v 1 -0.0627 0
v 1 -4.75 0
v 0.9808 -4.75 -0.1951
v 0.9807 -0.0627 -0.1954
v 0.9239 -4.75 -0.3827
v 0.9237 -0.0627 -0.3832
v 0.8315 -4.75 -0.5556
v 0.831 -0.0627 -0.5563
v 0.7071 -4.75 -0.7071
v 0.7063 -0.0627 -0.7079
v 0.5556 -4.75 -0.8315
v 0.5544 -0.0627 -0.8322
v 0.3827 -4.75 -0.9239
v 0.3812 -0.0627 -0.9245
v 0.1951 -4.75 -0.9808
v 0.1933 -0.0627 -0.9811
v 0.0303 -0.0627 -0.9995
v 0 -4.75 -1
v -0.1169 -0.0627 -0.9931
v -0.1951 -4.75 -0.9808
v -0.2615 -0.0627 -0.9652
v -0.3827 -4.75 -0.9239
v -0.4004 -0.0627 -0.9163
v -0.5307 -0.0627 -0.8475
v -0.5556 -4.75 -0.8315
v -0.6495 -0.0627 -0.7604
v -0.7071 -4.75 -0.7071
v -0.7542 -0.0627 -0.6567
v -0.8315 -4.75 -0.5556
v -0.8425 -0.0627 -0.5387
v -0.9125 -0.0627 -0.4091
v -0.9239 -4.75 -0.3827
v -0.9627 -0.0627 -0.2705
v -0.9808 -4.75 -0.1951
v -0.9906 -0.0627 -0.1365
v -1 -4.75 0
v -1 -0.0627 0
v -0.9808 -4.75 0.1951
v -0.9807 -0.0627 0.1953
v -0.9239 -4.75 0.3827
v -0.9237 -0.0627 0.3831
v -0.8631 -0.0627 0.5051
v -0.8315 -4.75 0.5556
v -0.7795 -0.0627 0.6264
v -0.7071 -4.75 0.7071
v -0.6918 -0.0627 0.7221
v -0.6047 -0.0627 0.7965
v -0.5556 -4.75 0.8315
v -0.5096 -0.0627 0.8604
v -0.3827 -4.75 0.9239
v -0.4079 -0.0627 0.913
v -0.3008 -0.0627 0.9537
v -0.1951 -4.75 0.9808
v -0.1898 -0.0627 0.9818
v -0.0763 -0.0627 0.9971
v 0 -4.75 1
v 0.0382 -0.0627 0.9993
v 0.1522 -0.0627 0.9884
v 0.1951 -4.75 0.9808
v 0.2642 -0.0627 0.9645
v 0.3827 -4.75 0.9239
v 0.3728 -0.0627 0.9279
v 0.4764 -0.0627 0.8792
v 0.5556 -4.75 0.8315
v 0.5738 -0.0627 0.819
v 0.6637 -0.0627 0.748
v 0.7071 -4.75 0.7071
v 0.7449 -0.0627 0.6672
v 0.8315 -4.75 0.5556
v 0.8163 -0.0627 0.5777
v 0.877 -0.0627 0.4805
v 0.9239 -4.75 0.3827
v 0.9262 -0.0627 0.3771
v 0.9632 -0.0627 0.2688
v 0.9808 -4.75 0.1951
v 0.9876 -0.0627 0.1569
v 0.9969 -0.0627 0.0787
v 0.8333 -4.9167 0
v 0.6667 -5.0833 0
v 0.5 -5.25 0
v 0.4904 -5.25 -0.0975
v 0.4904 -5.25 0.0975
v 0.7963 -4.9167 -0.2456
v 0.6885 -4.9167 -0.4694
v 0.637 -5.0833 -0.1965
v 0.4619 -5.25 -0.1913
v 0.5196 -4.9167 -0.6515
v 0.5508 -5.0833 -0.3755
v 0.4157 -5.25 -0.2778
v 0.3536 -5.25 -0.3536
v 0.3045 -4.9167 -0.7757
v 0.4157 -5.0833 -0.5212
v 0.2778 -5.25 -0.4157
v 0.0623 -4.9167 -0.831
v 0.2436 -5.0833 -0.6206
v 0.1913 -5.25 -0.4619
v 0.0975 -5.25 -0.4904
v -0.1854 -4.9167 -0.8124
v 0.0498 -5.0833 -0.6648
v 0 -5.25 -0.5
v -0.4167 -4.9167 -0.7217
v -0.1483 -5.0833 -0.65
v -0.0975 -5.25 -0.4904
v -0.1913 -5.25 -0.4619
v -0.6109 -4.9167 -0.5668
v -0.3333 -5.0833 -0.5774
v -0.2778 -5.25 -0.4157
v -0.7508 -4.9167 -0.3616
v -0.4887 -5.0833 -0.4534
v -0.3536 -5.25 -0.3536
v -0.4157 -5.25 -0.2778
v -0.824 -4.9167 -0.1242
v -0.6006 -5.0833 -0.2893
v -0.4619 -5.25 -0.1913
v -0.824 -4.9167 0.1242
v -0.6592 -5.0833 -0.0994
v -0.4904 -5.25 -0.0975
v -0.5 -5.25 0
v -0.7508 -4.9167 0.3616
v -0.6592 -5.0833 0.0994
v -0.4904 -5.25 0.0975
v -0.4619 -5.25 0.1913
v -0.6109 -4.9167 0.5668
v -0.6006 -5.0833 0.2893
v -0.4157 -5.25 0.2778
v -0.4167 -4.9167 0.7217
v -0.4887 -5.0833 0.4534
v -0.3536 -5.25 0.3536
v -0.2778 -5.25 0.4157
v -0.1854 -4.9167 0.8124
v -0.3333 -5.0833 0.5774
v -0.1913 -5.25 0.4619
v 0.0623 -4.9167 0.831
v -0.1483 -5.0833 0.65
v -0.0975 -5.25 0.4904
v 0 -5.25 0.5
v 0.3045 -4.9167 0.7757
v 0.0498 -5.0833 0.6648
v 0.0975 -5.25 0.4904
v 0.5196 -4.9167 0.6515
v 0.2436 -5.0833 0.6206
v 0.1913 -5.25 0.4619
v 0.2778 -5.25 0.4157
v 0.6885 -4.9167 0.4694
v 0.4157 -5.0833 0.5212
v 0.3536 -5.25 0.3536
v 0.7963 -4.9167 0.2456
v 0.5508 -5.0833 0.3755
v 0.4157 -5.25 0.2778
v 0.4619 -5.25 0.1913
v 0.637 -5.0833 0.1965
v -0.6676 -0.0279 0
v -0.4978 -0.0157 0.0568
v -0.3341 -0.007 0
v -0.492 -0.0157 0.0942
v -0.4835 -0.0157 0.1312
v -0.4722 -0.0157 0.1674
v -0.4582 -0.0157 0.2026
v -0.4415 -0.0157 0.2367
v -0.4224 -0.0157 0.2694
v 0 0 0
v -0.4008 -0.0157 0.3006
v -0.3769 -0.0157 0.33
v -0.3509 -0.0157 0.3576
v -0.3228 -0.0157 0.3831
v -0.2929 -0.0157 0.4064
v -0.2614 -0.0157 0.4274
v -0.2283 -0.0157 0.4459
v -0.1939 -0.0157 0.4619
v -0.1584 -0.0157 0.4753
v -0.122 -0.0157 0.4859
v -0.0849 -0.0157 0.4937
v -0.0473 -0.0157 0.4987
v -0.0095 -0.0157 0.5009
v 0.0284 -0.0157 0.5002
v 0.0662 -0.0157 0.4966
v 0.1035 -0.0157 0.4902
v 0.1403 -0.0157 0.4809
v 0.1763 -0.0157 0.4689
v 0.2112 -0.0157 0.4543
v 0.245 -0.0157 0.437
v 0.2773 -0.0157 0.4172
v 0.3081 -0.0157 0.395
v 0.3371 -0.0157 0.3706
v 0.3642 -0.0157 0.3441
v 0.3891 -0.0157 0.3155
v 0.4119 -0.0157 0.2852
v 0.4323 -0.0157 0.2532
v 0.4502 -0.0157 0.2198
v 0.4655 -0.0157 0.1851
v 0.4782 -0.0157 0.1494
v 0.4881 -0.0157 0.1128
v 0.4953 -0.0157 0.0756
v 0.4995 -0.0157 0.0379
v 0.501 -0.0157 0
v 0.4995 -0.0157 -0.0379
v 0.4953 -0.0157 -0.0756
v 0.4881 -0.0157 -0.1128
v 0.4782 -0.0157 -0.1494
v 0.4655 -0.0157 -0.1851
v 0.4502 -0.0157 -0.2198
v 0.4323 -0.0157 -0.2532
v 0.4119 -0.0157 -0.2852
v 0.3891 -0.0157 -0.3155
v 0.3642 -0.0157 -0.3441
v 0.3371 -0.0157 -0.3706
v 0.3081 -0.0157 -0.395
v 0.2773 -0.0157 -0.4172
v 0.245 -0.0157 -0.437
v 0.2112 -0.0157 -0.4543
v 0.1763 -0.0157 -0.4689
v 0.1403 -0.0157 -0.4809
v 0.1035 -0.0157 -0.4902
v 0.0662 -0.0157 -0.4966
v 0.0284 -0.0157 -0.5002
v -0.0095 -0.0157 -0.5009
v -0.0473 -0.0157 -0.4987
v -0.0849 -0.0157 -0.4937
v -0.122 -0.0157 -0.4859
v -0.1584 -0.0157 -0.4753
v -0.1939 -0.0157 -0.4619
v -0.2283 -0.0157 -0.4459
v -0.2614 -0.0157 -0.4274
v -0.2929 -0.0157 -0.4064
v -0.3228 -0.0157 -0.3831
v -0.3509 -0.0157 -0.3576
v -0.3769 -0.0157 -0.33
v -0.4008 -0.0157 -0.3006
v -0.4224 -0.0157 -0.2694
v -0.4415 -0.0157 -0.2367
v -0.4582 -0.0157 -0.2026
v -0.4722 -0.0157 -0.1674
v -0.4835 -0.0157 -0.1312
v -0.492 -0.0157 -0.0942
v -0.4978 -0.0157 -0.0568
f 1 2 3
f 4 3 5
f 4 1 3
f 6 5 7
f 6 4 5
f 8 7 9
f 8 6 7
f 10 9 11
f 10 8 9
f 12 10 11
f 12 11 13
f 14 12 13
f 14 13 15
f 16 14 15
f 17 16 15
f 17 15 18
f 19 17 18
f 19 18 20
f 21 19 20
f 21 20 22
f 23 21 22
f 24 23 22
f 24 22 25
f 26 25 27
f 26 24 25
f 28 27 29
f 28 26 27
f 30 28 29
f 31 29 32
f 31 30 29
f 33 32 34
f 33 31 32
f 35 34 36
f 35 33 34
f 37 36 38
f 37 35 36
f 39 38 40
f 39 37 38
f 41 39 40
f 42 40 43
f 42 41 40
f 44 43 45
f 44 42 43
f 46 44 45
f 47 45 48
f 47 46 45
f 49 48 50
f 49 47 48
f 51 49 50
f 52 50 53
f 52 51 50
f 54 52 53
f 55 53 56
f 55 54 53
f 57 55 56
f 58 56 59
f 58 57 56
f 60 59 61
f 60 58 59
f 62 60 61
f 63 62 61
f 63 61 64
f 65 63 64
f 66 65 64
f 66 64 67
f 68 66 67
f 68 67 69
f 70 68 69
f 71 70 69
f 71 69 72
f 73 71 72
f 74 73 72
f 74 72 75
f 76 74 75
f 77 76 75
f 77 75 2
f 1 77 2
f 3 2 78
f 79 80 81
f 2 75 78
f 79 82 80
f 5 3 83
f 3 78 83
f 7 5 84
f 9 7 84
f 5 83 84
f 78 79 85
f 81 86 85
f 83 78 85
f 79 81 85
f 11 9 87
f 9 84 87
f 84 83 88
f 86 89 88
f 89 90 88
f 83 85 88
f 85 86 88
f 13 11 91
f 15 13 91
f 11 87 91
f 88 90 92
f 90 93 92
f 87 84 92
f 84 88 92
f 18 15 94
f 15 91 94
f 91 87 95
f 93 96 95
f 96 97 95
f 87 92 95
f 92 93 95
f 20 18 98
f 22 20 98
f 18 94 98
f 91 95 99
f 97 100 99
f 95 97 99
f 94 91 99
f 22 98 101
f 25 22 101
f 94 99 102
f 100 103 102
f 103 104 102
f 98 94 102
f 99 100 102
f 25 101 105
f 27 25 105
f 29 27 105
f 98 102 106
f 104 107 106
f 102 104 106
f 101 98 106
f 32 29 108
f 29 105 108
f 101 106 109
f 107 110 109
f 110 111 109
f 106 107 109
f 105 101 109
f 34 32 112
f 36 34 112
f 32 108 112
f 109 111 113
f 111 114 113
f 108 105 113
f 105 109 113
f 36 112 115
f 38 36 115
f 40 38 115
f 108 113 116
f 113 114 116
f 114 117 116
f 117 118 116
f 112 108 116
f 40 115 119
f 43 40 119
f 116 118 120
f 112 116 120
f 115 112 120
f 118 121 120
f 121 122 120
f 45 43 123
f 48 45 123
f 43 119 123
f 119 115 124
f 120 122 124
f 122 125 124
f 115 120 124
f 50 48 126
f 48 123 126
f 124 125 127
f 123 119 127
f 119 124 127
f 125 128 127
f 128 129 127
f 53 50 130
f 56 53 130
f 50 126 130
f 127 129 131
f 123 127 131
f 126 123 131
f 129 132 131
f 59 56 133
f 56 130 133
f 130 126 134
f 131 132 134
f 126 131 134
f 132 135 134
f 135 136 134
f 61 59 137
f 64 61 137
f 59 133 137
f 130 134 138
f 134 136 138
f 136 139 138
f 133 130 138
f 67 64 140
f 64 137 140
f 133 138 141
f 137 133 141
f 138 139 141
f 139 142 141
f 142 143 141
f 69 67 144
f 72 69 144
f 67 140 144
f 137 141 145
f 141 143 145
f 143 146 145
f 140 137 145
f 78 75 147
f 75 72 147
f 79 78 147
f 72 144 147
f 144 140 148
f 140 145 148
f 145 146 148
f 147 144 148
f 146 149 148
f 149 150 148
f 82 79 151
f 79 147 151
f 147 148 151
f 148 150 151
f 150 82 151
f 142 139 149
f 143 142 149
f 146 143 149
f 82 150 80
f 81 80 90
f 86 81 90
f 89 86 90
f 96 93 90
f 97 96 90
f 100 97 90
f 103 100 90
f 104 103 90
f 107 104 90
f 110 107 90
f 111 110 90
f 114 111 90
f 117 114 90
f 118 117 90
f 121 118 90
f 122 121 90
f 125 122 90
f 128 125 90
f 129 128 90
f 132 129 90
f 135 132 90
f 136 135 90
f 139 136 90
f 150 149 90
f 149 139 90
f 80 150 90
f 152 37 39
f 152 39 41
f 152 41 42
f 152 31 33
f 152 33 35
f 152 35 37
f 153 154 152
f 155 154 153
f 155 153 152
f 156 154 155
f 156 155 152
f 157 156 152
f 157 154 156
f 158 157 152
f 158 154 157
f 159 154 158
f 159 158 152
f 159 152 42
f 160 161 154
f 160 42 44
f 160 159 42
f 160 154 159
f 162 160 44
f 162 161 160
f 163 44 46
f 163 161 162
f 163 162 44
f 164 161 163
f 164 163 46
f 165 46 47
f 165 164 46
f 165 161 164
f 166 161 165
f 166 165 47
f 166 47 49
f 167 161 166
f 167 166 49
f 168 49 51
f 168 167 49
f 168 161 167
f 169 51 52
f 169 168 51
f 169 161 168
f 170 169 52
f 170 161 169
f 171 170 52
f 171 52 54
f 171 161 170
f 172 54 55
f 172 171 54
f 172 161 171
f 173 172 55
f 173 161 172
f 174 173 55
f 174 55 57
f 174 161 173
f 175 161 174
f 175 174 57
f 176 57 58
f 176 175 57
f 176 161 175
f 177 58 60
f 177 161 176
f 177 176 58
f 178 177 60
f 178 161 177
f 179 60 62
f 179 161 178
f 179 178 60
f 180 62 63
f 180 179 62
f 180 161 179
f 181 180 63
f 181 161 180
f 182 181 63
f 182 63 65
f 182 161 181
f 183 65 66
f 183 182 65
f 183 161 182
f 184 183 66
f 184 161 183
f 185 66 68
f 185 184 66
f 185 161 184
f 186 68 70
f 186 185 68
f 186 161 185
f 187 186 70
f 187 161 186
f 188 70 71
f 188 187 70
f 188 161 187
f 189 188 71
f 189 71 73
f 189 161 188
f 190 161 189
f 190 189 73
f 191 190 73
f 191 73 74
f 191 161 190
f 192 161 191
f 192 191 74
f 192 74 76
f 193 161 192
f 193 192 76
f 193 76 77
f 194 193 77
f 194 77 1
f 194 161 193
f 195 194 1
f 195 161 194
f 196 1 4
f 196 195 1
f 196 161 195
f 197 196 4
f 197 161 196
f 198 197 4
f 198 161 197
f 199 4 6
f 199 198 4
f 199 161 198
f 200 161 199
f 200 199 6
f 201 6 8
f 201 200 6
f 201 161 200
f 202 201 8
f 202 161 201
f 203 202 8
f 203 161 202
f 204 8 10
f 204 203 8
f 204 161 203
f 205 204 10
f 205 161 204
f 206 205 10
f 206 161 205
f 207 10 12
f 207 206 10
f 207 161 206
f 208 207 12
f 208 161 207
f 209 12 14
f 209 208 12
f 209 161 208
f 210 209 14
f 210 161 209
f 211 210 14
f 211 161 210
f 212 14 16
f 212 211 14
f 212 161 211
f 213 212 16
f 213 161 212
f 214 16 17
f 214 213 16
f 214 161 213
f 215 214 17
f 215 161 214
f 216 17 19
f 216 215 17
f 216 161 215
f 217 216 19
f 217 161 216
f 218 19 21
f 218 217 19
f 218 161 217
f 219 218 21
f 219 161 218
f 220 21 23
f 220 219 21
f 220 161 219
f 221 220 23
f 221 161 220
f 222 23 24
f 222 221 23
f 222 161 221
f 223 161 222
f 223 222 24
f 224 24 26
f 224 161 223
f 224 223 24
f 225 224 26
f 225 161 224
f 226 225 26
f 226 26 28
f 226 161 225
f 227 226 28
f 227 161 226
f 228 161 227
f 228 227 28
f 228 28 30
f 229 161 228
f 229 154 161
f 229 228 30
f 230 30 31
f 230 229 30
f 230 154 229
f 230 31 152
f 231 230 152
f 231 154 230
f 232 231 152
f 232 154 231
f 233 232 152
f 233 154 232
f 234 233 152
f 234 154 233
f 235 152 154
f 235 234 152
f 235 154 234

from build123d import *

# Parameters (mm, degrees)
SKETCH1_R                 = 1
BOSS_EXTRUDE_5_25MM_DEPTH = 5.25
F_0_5_X_45_DEG_SIZE       = 0.5


with BuildPart() as part:
    # Sketch1 → Boss-Extrude 5.25mm (new body)
    with BuildSketch(Plane(origin=(0, 0, 0), x_dir=(1, 0, 0), z_dir=(0, 1, 0))):
        Circle(SKETCH1_R)
    extrude(amount=-BOSS_EXTRUDE_5_25MM_DEPTH)

    # 0.5 x 45 deg
    f_0_5_x_45_deg_edges = [part.edges().sort_by_distance(p)[0] for p in [
        (-1, -5.25, 0),
    ]]
    chamfer(f_0_5_x_45_deg_edges, length=F_0_5_X_45_DEG_SIZE)

    # Sketch2 → SR8 (revolve, cut)
    with BuildSketch(Plane.XY):
        with BuildLine():
            Line((0, 2), (-2, 2))
            Line((-2, 2), (-2, -0.254033308))
            ThreePointArc((-2, -0.254033308), (-1.00803434, -0.06376243), (0, 0))
            Line((0, 0), (0, 2))
        make_face()
    revolve(axis=Axis((0, 0, 0), (0, 1, 0)), mode=Mode.SUBTRACT)


solid = part.part
